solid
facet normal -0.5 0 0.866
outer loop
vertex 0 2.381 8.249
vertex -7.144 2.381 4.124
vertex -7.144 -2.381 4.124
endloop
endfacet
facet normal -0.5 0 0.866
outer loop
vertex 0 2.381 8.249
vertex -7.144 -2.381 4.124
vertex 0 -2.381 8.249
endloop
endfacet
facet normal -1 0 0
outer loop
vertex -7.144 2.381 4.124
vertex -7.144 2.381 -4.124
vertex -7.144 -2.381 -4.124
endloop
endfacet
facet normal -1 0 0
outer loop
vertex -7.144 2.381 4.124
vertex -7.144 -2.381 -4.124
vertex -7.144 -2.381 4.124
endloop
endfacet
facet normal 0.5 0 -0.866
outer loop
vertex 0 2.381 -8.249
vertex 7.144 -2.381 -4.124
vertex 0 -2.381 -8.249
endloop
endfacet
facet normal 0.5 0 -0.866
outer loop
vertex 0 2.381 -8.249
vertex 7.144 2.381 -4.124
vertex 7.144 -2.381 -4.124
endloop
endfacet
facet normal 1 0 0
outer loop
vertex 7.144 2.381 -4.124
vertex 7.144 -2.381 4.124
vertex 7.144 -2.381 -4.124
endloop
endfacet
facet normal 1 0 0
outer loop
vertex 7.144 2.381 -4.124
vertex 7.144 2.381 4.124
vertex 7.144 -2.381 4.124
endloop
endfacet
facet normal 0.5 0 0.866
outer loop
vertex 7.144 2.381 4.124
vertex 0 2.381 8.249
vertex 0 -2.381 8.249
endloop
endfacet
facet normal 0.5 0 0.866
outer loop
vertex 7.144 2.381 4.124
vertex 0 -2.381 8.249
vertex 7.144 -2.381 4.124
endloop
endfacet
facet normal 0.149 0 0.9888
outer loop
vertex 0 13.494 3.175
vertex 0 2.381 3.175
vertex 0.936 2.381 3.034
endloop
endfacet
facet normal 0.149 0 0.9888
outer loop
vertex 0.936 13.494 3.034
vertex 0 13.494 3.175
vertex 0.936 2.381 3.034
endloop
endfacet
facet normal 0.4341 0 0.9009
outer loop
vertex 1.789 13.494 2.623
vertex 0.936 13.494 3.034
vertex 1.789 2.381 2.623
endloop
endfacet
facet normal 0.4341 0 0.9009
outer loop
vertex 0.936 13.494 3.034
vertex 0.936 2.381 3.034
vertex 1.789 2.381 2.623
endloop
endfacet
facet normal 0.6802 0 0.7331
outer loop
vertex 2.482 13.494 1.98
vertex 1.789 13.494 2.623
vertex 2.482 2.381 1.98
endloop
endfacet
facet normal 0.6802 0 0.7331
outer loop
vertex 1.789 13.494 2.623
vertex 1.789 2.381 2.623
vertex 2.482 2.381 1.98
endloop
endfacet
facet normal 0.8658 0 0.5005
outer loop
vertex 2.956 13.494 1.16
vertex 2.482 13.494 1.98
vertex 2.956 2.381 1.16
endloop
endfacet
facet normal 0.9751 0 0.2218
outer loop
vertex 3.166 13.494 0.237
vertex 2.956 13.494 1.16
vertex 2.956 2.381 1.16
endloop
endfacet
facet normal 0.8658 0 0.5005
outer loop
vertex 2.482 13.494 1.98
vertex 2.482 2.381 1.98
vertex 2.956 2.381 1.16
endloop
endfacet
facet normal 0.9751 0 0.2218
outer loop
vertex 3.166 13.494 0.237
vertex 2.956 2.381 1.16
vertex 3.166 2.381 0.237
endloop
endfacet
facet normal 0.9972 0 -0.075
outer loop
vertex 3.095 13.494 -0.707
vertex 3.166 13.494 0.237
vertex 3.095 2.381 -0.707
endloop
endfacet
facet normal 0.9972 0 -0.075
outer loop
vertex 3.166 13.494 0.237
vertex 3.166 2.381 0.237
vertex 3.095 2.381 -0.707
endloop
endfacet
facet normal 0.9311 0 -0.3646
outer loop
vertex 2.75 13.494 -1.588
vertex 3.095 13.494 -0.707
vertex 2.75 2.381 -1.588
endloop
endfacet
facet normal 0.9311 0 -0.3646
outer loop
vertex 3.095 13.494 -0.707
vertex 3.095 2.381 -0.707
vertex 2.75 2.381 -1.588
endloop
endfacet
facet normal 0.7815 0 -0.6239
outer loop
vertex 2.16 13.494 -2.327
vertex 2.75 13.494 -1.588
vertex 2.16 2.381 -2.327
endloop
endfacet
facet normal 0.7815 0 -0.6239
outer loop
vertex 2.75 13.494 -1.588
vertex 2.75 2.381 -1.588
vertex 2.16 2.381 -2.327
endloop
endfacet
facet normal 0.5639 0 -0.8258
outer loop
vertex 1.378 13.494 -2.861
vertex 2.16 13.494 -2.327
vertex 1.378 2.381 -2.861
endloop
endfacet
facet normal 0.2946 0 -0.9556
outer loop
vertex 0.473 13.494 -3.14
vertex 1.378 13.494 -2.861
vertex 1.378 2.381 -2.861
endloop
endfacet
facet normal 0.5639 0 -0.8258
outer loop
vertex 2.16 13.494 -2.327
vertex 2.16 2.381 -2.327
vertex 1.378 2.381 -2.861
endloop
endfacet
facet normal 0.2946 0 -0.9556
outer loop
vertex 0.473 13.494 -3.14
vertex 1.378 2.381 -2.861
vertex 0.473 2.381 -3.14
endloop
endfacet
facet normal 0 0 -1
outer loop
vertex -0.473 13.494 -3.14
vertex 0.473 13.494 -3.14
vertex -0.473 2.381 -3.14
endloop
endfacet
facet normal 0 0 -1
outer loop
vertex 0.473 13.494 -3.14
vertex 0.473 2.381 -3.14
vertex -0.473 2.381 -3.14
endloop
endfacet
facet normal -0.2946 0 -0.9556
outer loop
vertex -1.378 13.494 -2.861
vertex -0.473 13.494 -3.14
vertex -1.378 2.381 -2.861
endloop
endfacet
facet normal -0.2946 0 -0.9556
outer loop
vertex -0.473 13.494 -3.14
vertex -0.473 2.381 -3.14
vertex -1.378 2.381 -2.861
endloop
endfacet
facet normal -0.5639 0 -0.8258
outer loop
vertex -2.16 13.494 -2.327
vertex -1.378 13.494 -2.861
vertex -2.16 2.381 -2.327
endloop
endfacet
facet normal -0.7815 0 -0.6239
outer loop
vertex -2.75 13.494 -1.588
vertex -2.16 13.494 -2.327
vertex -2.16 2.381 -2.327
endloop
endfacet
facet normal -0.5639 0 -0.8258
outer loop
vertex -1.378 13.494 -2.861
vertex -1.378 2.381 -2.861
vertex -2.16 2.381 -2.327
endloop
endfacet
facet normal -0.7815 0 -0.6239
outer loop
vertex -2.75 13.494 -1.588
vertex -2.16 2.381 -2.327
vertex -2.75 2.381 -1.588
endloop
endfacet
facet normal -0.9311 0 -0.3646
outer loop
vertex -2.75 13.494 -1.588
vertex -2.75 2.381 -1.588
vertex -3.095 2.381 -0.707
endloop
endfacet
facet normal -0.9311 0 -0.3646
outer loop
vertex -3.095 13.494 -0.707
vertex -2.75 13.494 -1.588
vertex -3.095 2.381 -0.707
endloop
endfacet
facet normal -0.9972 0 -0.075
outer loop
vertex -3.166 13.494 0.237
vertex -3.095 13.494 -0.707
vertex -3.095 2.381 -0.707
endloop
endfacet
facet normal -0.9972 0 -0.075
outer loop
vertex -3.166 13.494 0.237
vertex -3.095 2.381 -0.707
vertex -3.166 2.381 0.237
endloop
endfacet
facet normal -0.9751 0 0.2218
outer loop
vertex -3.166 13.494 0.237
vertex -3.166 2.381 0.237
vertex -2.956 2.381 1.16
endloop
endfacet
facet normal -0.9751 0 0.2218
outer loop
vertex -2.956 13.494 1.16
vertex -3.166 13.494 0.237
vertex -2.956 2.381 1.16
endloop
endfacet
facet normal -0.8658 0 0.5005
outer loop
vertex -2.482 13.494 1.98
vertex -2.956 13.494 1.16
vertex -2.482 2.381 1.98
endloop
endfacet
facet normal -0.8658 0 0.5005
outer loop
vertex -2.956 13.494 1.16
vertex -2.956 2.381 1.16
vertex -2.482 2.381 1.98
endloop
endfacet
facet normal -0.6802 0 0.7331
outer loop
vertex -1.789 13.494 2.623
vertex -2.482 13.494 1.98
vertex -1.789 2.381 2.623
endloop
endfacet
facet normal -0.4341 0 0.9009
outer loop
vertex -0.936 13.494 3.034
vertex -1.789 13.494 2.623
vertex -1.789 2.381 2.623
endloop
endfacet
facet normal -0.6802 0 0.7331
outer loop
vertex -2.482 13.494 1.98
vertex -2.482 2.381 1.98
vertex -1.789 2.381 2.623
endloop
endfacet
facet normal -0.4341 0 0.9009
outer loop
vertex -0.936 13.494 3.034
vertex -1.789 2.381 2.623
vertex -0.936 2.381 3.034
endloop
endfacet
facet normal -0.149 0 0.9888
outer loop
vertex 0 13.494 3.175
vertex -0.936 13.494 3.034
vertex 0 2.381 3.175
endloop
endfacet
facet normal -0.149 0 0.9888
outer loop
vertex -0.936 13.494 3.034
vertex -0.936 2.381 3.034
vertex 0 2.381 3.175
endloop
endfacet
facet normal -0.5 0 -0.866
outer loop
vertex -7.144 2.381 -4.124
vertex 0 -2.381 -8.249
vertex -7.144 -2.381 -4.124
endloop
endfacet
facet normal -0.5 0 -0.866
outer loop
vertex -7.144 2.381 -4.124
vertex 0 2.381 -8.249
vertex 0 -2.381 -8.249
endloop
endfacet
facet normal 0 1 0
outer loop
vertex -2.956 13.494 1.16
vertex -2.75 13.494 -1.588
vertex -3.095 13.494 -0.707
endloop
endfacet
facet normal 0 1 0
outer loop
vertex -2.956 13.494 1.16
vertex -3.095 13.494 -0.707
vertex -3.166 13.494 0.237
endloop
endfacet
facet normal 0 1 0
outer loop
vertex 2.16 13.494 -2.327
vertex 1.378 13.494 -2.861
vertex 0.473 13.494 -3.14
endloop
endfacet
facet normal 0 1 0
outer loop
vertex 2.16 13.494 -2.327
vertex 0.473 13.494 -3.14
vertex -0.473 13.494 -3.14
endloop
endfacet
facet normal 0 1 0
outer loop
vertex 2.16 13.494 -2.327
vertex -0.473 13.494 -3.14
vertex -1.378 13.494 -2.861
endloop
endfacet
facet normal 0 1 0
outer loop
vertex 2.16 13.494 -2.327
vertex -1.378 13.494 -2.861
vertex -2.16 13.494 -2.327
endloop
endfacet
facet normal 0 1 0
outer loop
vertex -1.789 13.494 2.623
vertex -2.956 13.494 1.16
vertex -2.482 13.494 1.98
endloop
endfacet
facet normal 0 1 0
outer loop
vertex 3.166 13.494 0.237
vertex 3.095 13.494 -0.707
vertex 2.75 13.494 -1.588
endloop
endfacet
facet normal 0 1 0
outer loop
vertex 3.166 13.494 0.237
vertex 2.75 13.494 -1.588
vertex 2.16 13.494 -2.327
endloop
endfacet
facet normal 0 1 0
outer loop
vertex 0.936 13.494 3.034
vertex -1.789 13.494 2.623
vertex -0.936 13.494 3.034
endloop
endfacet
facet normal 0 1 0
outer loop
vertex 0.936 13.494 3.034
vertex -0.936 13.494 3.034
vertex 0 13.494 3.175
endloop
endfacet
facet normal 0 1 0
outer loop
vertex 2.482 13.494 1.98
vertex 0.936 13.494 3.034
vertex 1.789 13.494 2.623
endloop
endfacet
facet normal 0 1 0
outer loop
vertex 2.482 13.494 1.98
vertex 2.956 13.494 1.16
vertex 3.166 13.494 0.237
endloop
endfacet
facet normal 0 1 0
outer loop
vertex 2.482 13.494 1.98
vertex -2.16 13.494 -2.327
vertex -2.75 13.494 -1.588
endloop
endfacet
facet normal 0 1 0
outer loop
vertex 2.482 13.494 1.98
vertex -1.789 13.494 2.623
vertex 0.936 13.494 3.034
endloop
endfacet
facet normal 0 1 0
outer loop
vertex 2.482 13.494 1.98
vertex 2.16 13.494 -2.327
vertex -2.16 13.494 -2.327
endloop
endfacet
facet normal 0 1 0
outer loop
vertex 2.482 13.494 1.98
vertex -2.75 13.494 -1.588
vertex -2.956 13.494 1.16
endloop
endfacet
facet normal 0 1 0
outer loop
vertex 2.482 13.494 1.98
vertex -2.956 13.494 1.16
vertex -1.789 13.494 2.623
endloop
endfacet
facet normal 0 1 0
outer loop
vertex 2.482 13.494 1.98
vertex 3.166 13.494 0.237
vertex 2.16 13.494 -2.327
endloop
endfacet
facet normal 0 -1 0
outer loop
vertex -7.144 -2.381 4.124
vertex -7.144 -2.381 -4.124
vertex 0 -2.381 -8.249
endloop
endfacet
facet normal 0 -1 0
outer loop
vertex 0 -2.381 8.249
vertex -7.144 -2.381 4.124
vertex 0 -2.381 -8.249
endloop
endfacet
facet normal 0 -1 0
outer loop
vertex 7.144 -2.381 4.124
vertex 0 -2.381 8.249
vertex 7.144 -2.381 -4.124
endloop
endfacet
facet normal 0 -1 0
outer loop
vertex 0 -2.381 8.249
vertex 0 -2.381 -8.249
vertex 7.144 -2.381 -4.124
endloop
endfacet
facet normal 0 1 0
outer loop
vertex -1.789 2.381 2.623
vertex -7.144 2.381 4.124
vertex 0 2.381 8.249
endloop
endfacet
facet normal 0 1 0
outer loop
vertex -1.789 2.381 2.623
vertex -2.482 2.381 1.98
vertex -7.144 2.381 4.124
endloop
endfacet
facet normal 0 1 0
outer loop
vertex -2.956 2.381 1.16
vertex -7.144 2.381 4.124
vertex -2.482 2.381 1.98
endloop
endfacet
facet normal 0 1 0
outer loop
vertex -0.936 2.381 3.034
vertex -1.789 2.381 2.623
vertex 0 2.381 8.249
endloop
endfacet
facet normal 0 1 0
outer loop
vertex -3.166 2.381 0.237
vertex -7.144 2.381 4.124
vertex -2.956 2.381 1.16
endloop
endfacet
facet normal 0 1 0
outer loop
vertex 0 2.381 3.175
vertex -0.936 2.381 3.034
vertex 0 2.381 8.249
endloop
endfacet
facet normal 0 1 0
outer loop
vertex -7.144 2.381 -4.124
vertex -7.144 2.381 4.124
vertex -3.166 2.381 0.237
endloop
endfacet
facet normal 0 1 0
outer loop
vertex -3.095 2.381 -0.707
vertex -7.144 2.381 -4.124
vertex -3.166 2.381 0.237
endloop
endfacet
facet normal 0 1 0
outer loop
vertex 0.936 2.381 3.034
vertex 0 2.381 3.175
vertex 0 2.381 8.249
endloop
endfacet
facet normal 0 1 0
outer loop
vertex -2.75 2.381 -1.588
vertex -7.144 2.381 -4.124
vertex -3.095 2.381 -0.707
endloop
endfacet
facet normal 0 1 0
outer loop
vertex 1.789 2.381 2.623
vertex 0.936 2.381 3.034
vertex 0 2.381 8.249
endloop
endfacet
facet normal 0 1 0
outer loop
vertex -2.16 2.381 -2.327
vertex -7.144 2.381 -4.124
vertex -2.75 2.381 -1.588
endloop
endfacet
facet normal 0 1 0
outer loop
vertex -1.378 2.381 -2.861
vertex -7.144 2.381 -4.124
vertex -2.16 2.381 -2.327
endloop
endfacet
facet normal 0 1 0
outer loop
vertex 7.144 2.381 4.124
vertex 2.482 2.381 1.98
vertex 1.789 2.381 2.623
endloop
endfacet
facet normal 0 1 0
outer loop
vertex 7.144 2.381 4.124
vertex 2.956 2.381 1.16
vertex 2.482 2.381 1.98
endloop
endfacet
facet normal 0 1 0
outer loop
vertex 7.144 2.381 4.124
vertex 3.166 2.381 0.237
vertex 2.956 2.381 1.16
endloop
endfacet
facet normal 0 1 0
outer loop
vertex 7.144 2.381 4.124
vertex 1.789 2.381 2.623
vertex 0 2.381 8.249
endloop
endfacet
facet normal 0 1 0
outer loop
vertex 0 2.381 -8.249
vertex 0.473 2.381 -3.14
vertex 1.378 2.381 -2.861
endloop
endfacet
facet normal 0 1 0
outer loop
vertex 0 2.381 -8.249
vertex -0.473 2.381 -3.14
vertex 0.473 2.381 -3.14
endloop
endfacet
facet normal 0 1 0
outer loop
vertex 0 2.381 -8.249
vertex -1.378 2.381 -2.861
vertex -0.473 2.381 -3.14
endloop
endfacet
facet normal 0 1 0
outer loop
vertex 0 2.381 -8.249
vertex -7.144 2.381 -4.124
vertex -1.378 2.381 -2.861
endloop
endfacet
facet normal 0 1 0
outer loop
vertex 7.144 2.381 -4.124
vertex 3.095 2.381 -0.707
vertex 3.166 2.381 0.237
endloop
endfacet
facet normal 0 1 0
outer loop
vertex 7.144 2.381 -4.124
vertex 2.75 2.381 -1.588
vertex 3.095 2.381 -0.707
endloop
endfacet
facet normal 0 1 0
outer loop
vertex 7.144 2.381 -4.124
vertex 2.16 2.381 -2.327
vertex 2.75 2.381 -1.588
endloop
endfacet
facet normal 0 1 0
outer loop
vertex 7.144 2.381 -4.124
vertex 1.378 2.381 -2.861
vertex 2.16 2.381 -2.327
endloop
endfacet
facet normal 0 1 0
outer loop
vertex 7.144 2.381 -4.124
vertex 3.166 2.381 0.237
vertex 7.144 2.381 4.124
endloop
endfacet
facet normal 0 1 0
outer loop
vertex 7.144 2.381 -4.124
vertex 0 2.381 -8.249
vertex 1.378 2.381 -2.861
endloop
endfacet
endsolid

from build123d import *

# Parameters (mm, degrees)
BOSS_EXTRUDE1_DEPTH = 2.38125
SKETCH2_R           = 3.175
BOSS_EXTRUDE2_DEPTH = 11.1125


with BuildPart() as part:
    # Sketch1 → Boss-Extrude1 (new, symmetric)
    with BuildSketch(Plane(origin=(0, 0, 0), x_dir=(1, 0, 0), z_dir=(0, 1, 0))):
        Polygon((0, 8.248891971), (-7.14375, 4.124445986), (-7.14375, -4.124445986), (0, -8.248891971), (7.14375, -4.124445986), (7.14375, 4.124445986), align=None)
    extrude(amount=BOSS_EXTRUDE1_DEPTH, both=True)

    # Sketch2 → Boss-Extrude2 (add)
    with BuildSketch(Plane(origin=(0, 2.38125, 0), x_dir=(1, 0, 0), z_dir=(0, 1, 0))):
        with Locations(Location((0, 0, 0), (0, 0, 270))):
            Circle(SKETCH2_R)
    extrude(amount=BOSS_EXTRUDE2_DEPTH)


solid = part.part
